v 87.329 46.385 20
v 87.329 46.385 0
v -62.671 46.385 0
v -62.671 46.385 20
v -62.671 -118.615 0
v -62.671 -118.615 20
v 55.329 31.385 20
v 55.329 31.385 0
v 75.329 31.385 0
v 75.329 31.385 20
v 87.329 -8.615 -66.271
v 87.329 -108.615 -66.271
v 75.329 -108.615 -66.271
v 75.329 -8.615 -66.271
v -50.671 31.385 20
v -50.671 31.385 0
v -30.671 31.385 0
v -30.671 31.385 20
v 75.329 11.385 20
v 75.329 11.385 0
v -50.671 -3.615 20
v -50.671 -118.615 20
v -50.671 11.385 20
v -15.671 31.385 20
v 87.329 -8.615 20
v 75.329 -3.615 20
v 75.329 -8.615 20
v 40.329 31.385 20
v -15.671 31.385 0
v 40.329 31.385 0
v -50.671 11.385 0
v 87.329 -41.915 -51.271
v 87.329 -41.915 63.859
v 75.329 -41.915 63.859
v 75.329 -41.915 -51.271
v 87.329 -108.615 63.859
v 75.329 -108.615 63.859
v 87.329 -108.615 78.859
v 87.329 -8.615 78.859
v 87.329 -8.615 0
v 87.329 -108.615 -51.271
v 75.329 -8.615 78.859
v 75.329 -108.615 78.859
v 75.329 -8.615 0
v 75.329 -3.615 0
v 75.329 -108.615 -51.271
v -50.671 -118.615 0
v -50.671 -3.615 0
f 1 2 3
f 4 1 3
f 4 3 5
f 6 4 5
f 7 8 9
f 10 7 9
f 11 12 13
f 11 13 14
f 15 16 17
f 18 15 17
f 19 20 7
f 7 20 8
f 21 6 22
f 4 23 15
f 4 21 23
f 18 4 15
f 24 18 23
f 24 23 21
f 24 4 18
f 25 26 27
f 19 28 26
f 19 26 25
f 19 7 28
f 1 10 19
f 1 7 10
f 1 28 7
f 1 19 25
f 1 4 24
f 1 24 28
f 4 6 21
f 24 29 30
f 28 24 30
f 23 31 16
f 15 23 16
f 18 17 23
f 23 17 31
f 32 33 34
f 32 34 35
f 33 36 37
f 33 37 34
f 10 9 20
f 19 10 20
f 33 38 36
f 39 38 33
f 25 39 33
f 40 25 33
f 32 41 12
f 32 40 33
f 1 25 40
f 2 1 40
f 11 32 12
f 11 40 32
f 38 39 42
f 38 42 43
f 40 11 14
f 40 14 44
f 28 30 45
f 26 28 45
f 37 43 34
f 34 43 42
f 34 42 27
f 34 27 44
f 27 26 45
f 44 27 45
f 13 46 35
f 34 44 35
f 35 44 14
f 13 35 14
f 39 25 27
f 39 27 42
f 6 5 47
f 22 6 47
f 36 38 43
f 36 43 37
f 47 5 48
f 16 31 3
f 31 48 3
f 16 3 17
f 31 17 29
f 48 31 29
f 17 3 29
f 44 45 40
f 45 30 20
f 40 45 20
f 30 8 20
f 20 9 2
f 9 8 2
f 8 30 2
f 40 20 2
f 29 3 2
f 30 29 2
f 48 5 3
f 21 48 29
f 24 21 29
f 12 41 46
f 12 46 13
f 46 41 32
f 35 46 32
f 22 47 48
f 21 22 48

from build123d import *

# Parameters (mm, degrees)
BOSS_EXTRUDE2_DEPTH = 20
SKETCH2_W           = 15
SKETCH2_H           = 100
BOSS_EXTRUDE3_DEPTH = 12


with BuildPart() as part:
    # Sketch1 → Boss-Extrude2 (new body)
    with BuildSketch(Plane.XY):
        Polygon((87.329047187, 46.385009916), (-62.670952813, 46.385009916), (-62.670952813, -118.614990084), (-50.670952813, -118.614990084), (-50.670952813, -3.614990084), (-15.670952813, 31.385009916), (40.329047187, 31.385009916), (75.329047187, -3.614990084), (75.329047187, -8.614990084), (87.329047187, -8.614990084), align=None)
        Polygon((75.329047187, 11.385009916), (55.329047187, 31.385009916), (75.329047187, 31.385009916), align=None, mode=Mode.SUBTRACT)
        Polygon((-50.670952813, 31.385009916), (-30.670952813, 31.385009916), (-50.670952813, 11.385009916), align=None, mode=Mode.SUBTRACT)
    extrude(amount=BOSS_EXTRUDE2_DEPTH)

    # Sketch2 → Boss-Extrude3 (add)
    with BuildSketch(Plane(origin=(87.329047187, 0, 0), x_dir=(0, 0, -1), z_dir=(1, 0, 0))):
        Polygon((-20, -8.614990084), (-63.858795675, -8.614990084), (-63.858795675, -41.914961686), (51.271272263, -41.914961686), (51.271272263, -8.614990084), (0, -8.614990084), align=None)
        Polygon((-63.858795675, -41.914961686), (-63.858795675, -8.614990084), (-78.858795675, -8.614990084), (-78.858795675, -108.614990084), (-63.858795675, -108.614990084), align=None)
        with Locations((58.771272263, -58.614990084)):
            Rectangle(SKETCH2_W, SKETCH2_H)
    extrude(amount=-BOSS_EXTRUDE3_DEPTH)


solid = part.part
